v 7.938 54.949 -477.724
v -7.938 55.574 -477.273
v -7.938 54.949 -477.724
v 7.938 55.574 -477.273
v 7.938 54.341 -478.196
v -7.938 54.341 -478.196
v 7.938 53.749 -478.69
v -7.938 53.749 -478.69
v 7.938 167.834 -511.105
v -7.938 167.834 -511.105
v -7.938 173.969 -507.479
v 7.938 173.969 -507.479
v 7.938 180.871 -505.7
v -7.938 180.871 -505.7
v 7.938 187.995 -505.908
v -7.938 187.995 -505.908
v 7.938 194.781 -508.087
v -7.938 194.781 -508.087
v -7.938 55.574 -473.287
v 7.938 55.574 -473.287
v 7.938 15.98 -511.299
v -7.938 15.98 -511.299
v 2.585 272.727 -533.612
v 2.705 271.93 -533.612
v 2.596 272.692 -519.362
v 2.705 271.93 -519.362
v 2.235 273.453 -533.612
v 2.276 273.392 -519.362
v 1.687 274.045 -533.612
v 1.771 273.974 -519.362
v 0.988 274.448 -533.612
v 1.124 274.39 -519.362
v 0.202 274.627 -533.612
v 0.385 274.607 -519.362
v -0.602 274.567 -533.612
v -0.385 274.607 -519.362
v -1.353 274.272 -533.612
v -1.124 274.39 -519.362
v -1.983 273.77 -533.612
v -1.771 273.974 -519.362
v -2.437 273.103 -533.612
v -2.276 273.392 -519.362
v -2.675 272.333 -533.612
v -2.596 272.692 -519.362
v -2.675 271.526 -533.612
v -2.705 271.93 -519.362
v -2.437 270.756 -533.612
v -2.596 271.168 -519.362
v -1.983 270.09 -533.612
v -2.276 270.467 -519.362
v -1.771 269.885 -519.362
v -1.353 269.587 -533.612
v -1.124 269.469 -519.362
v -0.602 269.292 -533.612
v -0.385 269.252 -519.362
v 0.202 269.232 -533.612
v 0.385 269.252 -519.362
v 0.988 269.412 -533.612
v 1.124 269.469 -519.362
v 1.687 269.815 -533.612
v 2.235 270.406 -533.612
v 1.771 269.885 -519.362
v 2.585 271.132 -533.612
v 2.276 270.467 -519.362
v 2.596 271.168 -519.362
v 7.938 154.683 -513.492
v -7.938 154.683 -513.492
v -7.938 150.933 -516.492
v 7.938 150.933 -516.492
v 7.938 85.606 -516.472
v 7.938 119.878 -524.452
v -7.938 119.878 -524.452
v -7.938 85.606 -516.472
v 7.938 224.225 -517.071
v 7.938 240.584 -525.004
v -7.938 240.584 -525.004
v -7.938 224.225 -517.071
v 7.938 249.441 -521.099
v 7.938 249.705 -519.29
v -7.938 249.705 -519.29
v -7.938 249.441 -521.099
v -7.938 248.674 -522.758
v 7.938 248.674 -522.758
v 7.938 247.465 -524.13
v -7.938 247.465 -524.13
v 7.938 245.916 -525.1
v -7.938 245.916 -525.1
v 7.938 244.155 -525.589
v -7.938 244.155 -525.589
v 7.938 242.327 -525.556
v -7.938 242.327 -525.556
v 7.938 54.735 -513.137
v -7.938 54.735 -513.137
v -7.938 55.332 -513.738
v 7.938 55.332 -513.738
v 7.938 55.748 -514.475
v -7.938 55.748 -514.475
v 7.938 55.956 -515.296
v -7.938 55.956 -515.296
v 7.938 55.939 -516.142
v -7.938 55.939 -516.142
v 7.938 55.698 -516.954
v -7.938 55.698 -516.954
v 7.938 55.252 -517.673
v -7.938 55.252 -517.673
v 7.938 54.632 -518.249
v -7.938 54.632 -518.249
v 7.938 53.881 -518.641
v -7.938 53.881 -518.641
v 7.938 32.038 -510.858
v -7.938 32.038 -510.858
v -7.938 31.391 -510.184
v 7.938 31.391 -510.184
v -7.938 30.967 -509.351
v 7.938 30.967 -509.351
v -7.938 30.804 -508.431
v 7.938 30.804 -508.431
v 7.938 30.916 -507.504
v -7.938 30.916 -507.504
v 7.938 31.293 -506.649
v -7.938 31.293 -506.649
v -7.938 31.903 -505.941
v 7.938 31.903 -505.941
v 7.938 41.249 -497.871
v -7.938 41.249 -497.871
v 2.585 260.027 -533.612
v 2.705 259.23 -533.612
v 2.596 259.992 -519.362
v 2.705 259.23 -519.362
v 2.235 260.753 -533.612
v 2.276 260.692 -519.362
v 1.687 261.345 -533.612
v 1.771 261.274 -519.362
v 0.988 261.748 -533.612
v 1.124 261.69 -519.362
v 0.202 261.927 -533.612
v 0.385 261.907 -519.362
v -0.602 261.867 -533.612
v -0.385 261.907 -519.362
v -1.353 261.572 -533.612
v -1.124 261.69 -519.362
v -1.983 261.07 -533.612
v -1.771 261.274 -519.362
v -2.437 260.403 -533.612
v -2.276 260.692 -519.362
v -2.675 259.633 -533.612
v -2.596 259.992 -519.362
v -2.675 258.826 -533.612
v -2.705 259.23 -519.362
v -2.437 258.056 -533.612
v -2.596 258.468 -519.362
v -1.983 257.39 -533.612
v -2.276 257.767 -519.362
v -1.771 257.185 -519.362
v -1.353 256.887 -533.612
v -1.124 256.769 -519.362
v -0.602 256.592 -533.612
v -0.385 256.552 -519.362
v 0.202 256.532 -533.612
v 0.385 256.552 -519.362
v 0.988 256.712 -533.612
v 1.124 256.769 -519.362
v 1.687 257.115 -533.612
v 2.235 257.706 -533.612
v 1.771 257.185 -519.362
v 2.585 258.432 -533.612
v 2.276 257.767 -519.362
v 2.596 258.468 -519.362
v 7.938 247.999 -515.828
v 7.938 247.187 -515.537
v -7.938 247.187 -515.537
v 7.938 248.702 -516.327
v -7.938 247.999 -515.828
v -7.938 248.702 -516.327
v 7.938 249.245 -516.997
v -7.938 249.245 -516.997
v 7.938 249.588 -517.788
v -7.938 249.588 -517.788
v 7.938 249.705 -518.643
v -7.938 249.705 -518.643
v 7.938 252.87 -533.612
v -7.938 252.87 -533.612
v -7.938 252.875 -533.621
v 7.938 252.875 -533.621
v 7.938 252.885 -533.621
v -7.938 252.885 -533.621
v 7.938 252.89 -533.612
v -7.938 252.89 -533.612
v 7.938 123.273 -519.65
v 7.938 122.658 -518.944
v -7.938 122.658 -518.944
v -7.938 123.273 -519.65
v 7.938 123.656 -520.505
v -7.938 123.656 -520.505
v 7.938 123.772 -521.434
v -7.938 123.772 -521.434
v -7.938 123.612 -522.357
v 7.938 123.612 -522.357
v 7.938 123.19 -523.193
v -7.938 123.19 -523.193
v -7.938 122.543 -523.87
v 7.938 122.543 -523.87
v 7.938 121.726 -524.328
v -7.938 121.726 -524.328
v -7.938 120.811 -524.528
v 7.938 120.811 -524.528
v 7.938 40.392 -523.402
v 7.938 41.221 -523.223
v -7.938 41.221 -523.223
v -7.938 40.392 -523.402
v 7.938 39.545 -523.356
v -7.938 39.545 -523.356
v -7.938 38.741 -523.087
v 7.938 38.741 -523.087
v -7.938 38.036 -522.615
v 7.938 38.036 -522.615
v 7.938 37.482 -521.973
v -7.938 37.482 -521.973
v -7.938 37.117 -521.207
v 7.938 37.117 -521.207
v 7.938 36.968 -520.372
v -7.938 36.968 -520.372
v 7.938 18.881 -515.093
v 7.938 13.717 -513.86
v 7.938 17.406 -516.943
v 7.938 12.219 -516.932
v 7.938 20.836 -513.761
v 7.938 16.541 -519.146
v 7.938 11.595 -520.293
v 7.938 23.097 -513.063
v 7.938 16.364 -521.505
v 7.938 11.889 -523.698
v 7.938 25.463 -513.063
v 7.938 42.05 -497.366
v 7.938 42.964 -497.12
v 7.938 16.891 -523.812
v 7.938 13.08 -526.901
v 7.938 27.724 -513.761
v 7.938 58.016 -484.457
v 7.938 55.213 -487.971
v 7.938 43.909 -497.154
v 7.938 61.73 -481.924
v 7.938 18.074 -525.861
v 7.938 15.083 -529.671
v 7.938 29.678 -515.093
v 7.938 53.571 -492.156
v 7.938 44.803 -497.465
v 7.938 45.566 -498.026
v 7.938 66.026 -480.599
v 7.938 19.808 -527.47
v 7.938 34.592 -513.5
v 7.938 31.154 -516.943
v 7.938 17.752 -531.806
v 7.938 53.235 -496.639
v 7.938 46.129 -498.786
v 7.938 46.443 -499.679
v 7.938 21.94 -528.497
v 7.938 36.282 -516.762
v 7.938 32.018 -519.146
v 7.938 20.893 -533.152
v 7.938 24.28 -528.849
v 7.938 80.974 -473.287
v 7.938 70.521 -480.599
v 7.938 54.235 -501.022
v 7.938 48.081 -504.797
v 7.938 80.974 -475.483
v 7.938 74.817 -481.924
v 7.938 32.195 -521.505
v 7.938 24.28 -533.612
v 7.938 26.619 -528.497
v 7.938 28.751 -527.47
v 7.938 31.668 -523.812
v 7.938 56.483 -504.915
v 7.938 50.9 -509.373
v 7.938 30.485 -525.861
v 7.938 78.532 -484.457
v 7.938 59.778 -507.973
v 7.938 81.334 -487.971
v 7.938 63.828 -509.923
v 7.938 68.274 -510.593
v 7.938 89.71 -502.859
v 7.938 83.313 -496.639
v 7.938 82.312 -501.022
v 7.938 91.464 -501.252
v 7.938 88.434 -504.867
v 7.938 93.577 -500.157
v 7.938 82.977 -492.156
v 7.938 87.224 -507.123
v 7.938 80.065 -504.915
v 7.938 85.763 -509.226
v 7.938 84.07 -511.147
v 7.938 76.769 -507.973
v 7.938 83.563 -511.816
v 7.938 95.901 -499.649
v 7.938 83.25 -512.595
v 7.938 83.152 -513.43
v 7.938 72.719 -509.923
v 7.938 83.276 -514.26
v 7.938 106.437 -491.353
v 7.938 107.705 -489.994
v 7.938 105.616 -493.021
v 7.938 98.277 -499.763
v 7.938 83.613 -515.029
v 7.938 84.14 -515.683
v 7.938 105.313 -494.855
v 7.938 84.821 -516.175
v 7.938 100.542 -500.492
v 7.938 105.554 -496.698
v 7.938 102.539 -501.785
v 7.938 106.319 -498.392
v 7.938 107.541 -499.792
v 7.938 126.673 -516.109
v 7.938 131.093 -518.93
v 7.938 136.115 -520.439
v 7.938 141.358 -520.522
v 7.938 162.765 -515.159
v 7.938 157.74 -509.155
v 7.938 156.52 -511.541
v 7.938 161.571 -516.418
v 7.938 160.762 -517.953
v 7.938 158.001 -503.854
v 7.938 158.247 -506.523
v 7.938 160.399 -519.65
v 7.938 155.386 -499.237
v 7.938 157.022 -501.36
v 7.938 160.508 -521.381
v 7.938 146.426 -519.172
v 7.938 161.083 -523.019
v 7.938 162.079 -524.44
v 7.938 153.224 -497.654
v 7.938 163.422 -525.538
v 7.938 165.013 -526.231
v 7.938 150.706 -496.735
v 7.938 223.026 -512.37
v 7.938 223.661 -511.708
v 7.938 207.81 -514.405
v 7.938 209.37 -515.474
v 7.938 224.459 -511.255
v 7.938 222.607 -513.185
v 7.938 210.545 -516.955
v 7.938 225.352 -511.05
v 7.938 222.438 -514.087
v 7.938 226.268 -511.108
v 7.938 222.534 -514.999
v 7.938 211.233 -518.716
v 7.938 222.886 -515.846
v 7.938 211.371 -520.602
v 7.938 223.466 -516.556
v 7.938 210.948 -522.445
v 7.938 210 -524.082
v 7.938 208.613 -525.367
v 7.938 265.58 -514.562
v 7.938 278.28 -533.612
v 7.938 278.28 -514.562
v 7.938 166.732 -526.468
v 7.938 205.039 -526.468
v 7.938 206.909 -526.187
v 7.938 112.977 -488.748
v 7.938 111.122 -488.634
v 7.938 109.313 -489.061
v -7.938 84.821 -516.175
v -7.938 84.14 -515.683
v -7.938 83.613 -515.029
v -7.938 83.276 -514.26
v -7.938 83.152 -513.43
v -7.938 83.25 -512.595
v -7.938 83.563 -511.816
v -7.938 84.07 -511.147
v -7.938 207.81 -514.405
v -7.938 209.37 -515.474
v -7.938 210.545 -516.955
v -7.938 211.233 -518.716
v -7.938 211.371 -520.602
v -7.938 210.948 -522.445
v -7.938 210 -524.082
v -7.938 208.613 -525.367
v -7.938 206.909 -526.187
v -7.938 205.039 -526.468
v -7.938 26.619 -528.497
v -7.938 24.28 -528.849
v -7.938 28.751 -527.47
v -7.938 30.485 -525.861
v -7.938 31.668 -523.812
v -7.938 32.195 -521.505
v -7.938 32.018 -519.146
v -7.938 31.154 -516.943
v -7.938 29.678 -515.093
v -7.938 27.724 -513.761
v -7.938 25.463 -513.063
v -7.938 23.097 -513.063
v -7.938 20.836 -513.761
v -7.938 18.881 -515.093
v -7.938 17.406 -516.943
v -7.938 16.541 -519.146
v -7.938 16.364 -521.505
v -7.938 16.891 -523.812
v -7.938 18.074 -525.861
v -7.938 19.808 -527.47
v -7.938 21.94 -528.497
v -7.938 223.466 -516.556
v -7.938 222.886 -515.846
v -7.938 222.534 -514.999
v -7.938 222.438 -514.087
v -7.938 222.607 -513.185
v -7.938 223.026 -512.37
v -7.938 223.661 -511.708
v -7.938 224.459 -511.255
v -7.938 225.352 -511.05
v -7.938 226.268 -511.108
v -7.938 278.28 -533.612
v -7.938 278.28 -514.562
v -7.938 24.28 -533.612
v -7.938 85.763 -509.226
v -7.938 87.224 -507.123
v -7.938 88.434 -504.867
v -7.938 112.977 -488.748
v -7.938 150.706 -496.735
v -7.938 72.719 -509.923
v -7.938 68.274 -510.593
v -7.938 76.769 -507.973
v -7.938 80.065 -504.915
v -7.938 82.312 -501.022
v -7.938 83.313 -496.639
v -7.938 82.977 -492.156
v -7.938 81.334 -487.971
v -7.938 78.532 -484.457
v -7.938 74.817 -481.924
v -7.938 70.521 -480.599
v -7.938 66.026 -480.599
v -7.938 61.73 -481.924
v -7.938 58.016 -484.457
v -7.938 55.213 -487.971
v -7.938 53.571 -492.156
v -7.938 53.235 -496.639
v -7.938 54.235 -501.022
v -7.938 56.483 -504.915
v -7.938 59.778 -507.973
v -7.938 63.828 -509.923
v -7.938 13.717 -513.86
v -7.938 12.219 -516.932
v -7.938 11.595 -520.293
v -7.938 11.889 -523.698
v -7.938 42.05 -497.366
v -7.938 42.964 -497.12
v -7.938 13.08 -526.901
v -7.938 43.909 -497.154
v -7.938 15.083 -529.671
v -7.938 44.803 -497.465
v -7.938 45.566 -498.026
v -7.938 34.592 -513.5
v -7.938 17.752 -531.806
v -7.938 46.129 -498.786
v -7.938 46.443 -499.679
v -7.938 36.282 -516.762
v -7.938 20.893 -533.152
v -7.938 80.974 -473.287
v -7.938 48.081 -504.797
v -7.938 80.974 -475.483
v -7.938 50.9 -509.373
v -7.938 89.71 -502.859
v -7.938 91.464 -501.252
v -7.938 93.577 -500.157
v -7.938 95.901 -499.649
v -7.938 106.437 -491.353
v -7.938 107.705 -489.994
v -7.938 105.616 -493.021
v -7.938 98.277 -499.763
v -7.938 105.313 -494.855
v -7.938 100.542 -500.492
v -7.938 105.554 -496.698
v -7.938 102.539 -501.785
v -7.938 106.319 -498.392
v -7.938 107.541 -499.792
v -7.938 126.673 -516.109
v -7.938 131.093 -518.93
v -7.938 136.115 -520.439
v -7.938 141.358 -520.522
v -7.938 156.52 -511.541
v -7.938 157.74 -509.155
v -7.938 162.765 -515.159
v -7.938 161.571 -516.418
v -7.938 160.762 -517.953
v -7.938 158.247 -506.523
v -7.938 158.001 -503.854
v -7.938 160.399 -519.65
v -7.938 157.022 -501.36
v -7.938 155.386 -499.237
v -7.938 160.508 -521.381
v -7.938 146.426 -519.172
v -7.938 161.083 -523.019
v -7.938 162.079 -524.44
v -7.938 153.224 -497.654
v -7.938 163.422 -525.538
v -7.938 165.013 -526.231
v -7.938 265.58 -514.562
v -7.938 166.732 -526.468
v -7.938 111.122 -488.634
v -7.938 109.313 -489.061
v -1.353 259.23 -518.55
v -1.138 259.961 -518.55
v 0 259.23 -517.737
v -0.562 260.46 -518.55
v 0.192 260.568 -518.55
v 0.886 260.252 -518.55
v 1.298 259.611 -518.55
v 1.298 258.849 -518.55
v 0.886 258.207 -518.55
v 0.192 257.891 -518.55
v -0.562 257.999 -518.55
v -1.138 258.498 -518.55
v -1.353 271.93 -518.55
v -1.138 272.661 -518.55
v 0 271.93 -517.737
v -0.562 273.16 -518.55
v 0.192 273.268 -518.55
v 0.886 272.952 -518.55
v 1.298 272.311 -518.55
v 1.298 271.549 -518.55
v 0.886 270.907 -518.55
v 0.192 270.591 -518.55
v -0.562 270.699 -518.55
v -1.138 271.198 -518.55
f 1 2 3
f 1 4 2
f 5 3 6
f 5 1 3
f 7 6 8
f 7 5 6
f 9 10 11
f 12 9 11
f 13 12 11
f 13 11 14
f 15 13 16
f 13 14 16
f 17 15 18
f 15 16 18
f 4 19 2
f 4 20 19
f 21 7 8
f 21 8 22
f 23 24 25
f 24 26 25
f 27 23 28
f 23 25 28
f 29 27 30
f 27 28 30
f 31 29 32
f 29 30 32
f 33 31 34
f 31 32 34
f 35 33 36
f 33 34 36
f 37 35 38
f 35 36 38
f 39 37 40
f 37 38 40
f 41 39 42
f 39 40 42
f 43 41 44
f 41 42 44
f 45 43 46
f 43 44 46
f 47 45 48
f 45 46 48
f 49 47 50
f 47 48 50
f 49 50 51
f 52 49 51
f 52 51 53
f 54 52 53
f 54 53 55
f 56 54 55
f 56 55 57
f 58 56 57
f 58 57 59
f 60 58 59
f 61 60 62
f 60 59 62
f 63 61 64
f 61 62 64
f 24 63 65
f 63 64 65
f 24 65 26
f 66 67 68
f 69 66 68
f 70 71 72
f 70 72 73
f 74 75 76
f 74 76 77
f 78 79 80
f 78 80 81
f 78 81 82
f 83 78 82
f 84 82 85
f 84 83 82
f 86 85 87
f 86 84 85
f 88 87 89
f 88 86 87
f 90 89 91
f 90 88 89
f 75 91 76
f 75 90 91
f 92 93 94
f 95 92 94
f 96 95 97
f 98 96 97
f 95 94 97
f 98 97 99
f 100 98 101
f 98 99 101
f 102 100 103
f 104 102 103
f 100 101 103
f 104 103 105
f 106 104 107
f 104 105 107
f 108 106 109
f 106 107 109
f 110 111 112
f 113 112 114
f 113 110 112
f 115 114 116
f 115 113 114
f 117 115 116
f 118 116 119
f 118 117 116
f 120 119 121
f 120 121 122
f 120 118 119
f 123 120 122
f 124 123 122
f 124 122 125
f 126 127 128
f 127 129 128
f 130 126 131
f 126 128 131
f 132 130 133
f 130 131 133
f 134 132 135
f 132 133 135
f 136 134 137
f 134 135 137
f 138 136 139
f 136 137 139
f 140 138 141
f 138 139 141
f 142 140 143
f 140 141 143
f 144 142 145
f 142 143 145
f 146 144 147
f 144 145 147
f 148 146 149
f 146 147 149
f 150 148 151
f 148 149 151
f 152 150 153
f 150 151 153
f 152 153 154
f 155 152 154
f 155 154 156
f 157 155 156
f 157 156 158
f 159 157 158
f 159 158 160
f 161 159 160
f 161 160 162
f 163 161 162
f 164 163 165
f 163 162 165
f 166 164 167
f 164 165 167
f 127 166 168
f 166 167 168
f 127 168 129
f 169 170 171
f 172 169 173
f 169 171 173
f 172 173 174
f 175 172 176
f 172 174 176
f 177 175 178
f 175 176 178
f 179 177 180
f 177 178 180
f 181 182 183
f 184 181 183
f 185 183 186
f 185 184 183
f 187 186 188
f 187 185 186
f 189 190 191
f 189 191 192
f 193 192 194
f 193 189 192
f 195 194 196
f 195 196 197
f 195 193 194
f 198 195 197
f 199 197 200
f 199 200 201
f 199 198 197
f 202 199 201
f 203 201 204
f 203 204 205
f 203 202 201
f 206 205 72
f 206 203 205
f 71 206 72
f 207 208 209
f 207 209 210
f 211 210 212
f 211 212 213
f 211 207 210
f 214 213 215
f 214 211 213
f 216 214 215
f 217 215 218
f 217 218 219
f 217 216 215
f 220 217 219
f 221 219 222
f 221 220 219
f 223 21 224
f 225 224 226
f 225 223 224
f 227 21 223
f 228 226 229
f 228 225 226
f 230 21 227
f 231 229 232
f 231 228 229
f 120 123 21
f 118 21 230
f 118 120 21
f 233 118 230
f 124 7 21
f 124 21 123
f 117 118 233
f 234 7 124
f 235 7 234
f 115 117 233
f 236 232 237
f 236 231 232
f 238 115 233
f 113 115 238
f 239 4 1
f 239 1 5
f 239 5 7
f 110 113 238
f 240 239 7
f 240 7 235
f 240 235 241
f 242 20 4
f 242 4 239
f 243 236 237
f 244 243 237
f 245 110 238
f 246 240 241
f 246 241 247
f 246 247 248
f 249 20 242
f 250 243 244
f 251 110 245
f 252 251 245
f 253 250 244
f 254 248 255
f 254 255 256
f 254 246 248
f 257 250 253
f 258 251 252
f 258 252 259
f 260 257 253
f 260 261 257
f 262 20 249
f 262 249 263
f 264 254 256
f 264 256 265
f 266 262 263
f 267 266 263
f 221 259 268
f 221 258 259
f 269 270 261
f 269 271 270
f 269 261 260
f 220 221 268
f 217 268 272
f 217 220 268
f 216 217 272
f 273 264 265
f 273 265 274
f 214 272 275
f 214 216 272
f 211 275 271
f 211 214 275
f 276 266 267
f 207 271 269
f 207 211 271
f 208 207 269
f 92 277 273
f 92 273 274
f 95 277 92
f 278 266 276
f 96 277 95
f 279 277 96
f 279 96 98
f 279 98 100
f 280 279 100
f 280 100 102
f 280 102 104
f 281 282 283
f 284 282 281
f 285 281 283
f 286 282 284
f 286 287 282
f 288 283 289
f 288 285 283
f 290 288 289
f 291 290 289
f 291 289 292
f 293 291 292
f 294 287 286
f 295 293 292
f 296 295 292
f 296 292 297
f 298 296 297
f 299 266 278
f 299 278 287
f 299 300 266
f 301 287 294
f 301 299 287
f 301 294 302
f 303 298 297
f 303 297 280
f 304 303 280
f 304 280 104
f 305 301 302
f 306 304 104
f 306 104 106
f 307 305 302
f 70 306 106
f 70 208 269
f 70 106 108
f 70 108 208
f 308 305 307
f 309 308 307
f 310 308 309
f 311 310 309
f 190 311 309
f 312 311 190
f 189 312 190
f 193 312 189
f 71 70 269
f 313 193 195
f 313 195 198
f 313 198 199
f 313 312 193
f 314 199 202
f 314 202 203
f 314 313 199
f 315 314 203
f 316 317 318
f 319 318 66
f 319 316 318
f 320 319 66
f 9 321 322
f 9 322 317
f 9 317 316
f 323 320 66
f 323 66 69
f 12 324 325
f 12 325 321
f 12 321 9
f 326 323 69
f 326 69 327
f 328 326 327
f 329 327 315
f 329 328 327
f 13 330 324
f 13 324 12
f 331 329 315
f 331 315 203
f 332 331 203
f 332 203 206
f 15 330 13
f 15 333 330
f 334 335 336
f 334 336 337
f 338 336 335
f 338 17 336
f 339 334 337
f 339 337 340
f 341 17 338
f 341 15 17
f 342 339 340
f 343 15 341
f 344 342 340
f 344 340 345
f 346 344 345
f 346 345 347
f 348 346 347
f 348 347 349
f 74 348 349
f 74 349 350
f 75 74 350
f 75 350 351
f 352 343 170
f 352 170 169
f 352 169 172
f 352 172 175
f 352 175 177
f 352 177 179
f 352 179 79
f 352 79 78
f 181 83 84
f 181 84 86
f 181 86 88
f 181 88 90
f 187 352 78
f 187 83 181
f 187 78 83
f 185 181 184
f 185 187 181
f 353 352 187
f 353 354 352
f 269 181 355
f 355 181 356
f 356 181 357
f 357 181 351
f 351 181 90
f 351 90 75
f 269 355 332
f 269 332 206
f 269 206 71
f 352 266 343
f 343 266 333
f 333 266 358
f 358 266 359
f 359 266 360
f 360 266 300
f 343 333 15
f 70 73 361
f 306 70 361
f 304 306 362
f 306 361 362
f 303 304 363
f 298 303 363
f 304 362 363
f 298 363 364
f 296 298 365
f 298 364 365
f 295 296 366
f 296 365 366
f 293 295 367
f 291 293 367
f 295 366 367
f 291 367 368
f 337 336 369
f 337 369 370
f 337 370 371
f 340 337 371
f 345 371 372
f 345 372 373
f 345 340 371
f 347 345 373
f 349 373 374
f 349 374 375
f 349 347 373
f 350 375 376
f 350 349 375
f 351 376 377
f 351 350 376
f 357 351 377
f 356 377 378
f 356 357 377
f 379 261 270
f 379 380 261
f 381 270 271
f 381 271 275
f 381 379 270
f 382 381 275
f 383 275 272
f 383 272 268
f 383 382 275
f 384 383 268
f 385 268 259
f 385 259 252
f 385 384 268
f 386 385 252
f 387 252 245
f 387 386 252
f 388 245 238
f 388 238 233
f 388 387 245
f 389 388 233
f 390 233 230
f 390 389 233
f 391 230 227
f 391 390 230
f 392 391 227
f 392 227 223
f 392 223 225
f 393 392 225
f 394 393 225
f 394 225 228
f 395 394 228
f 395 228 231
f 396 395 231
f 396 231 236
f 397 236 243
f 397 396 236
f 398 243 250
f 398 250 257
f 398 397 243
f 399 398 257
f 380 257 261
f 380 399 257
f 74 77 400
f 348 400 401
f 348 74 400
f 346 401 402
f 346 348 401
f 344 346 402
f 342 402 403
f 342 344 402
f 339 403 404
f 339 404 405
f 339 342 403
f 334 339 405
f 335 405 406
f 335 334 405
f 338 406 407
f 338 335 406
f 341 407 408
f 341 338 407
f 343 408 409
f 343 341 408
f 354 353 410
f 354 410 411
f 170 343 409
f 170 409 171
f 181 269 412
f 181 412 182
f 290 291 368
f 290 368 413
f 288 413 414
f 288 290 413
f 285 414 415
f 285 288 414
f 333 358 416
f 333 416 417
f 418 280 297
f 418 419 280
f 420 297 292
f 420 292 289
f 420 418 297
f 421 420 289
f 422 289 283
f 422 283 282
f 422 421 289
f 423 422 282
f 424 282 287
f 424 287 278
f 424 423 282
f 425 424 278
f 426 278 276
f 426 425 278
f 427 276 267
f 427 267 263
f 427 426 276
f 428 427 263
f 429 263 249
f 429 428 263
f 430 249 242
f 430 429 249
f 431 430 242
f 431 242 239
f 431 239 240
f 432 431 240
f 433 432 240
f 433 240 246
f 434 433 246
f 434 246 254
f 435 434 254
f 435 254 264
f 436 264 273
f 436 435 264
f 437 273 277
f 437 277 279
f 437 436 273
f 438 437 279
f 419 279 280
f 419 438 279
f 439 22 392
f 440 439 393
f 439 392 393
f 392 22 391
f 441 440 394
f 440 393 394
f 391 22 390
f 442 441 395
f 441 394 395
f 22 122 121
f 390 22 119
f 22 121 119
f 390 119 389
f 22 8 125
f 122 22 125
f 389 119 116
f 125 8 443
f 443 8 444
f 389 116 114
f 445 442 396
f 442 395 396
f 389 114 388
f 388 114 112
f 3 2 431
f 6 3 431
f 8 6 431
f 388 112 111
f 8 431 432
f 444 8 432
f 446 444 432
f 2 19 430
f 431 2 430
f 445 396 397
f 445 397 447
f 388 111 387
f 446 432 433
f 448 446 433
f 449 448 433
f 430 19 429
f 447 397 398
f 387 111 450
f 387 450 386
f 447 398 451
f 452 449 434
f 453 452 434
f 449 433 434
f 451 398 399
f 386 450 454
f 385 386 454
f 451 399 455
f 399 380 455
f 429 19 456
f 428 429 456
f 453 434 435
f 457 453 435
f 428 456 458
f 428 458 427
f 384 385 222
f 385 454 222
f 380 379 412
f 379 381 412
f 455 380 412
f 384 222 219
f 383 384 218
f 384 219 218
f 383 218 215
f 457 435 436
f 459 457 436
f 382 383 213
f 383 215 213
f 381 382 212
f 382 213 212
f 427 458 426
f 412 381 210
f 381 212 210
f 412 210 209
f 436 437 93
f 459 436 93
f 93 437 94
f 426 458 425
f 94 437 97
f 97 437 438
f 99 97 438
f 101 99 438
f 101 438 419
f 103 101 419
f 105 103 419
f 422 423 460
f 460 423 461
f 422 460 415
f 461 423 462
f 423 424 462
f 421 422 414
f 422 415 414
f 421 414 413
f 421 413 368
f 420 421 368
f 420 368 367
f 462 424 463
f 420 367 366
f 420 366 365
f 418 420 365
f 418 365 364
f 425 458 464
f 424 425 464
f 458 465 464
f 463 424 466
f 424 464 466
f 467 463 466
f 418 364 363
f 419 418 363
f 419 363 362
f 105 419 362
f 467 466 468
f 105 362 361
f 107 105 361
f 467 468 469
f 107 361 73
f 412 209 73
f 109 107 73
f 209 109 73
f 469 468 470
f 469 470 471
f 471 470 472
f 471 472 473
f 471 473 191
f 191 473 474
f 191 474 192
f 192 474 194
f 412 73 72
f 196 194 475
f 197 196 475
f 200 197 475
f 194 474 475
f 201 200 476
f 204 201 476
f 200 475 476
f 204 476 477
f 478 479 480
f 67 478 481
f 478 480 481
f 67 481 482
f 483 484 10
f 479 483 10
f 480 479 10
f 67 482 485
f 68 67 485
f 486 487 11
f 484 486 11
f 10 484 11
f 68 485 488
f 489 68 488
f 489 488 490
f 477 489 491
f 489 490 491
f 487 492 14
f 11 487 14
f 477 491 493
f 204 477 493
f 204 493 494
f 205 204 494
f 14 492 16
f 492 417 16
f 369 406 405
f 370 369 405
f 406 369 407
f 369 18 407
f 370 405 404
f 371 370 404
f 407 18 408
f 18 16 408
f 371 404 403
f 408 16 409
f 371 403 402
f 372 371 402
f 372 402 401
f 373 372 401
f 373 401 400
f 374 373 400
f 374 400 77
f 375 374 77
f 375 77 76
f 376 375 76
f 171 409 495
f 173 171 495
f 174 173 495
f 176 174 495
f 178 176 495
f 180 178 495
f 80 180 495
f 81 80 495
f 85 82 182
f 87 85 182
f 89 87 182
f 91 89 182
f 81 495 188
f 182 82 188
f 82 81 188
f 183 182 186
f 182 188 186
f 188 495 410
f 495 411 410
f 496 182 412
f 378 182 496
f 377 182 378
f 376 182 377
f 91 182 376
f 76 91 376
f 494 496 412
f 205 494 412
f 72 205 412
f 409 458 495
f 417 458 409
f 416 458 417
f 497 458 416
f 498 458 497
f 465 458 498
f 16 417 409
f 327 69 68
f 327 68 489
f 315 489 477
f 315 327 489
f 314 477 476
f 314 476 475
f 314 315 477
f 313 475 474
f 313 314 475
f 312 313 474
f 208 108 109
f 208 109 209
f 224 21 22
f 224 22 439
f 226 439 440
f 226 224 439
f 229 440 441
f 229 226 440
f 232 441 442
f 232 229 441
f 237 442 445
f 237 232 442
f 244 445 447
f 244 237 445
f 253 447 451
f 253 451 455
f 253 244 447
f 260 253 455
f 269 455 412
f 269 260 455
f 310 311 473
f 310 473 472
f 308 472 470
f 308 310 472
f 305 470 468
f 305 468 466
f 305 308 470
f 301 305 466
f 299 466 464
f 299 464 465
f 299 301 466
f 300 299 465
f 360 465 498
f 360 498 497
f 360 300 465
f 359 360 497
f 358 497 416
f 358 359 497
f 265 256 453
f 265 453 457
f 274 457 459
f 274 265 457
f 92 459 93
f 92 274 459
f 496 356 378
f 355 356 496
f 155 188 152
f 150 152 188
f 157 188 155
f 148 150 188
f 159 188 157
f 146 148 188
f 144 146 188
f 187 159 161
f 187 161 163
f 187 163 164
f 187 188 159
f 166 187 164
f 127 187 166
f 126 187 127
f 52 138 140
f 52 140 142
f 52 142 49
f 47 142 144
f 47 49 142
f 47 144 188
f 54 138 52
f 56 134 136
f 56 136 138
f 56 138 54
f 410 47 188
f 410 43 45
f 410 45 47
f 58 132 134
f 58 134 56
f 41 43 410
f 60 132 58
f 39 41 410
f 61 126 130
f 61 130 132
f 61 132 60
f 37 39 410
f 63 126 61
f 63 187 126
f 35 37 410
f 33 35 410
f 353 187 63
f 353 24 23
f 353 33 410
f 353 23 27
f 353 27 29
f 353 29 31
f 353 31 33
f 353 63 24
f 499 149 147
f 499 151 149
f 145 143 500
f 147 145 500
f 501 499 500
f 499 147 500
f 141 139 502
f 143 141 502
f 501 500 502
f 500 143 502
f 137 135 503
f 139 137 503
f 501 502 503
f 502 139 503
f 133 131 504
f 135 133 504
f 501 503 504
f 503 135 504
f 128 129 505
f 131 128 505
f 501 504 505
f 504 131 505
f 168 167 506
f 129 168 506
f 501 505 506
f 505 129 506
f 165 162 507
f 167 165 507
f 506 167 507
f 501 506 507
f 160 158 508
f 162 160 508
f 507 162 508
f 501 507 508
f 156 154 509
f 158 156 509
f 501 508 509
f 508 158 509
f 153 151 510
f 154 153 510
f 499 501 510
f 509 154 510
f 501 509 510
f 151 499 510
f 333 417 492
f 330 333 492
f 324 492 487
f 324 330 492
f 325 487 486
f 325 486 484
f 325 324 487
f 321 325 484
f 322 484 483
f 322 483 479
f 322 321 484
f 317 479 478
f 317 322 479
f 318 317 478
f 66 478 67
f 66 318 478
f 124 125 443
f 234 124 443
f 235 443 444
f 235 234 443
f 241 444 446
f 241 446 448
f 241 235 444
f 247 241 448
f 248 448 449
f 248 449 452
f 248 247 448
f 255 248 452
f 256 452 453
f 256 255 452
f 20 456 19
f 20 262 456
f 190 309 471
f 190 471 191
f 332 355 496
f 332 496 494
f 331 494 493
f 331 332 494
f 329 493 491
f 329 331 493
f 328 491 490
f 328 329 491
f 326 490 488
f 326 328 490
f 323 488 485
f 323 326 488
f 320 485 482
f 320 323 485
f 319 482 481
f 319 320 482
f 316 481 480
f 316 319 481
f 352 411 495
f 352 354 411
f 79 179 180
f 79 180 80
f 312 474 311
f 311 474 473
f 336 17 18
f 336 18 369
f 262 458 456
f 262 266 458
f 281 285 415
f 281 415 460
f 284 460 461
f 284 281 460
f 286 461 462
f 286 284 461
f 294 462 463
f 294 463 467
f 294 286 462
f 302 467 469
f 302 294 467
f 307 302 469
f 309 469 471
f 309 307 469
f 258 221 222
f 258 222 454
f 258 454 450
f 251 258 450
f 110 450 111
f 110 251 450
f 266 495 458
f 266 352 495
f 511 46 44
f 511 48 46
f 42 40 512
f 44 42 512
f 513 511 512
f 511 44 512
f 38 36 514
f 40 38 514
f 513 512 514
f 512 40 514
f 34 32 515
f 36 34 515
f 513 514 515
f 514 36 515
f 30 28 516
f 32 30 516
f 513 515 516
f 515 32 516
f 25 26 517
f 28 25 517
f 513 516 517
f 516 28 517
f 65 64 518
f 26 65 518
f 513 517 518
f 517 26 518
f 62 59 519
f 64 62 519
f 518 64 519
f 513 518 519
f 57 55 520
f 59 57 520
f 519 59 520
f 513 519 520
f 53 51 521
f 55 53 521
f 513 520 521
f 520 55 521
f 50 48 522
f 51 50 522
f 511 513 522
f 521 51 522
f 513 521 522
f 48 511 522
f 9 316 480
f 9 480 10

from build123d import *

# Parameters (mm, degrees)
SKETCH1_R                       = 15.08125
SKETCH1_R_2                     = 7.9375
BOSS_EXTRUDE1_DEPTH             = 7.9375
TAP_DRILL_FOR_1_4_28_TAP1_D     = 5.4102
TAP_DRILL_FOR_1_4_28_TAP1_DEPTH = 14.249611939
TAP_DRILL_FOR_1_4_28_TAP1_TIP   = 1.625388061


with BuildPart() as part:
    # Sketch1 → Boss-Extrude1 (new body, symmetric)
    with BuildSketch(Plane(origin=(0, 0, 0), x_dir=(0, 0, -1), z_dir=(1, 0, 0))):
        with BuildLine():
            ThreePointArc((477.273006468, 55.573710947), (477.957555138, 54.643144528), (478.689532564, 53.74940531))
            Line((478.689532564, 53.74940531), (511.29915841, 15.980017214))
            ThreePointArc((511.29915841, 15.980017214), (525.339576994, 12.376406632), (533.611992871, 24.279620434))
            Line((533.611992871, 24.279620434), (533.611992871, 252.869620434))
            ThreePointArc((533.611992871, 252.869620434), (533.621992871, 252.879620434), (533.611992871, 252.889620434))
            Line((533.611992871, 252.889620434), (533.611992871, 278.279620434))
            Line((533.611992871, 278.279620434), (514.561992871, 278.279620434))
            Line((514.561992871, 278.279620434), (514.561992871, 265.579620434))
            Line((514.561992871, 265.579620434), (475.482925659, 80.973710947))
            Line((475.482925659, 80.973710947), (473.286992871, 80.973710947))
            Line((473.286992871, 80.973710947), (473.286992871, 55.573710947))
            Line((473.286992871, 55.573710947), (477.273006468, 55.573710947))
        make_face()
        with Locations((495.511992871, 68.273710947)):
            Circle(SKETCH1_R, mode=Mode.SUBTRACT)
        with BuildLine():
            Line((513.492352541, 154.682917565), (516.491551882, 150.932886553))
            ThreePointArc((516.491551882, 150.932886553), (520.662032348, 138.733869971), (516.108721588, 126.672515404))
            Line((516.108721588, 126.672515404), (499.792202262, 107.541452006))
            ThreePointArc((499.792202262, 107.541452006), (492.156570852, 105.964813857), (488.748431965, 112.977177526))
            Line((488.748431965, 112.977177526), (496.735281949, 150.706320271))
            ThreePointArc((496.735281949, 150.706320271), (503.854492534, 158.001314948), (513.492352541, 154.682917565))
        make_face(mode=Mode.SUBTRACT)
        with BuildLine():
            Line((505.940679161, 31.90308853), (497.871284255, 41.249289229))
            ThreePointArc((497.871284255, 41.249289229), (497.275971755, 44.367979343), (499.679180371, 46.442880148))
            ThreePointArc((499.679180371, 46.442880148), (507.170500261, 49.352034741), (513.137493678, 54.73516057))
            ThreePointArc((513.137493678, 54.73516057), (516.142098705, 55.938560413), (518.64094789, 53.8814811))
            Line((518.64094789, 53.8814811), (523.222631148, 41.220667502))
            ThreePointArc((523.222631148, 41.220667502), (522.874411989, 38.372433477), (520.372083072, 36.968138764))
            ThreePointArc((520.372083072, 36.968138764), (515.06938347, 35.555874927), (510.857508795, 32.038315555))
            ThreePointArc((510.857508795, 32.038315555), (508.431176446, 30.804189453), (505.940679161, 31.90308853))
        make_face(mode=Mode.SUBTRACT)
        with Locations((520.911992871, 24.279620434)):
            Circle(SKETCH1_R_2, mode=Mode.SUBTRACT)
        with BuildLine():
            ThreePointArc((518.944357913, 122.658172896), (522.790818804, 123.432213046), (524.452355406, 119.877822007))
            Line((524.452355406, 119.877822007), (516.472291206, 85.606211423))
            ThreePointArc((516.472291206, 85.606211423), (514.260132633, 83.275664888), (511.146510795, 84.069674807))
            ThreePointArc((511.146510795, 84.069674807), (508.195718311, 86.524018724), (504.866661886, 88.434087744))
            ThreePointArc((504.866661886, 88.434087744), (499.826228678, 94.721972649), (501.785115668, 102.539019742))
            Line((501.785115668, 102.539019742), (518.944357913, 122.658172896))
        make_face(mode=Mode.SUBTRACT)
        with BuildLine():
            ThreePointArc((526.468242871, 166.731606566), (522.219734771, 160.739425678), (515.159193487, 162.76545866))
            Line((515.159193487, 162.76545866), (511.105468766, 167.834009193))
            ThreePointArc((511.105468766, 167.834009193), (505.69956043, 180.870864765), (508.086772693, 194.780741319))
            Line((508.086772693, 194.780741319), (514.404519469, 207.809941801))
            ThreePointArc((514.404519469, 207.809941801), (521.5395726, 211.228293635), (526.468242871, 205.039406675))
            Line((526.468242871, 205.039406675), (526.468242871, 166.731606566))
        make_face(mode=Mode.SUBTRACT)
        with BuildLine():
            ThreePointArc((515.536548916, 247.187161956), (516.643598283, 248.996229375), (518.642714422, 249.704620434))
            Line((518.642714422, 249.704620434), (519.289846204, 249.704620434))
            ThreePointArc((519.289846204, 249.704620434), (524.671082031, 246.725792482), (525.003569607, 240.584085308))
            Line((525.003569607, 240.584085308), (517.071165151, 224.224947846))
            ThreePointArc((517.071165151, 224.224947846), (513.18532078, 222.606581), (511.108137945, 226.26775693))
            Line((511.108137945, 226.26775693), (515.536548916, 247.187161956))
        make_face(mode=Mode.SUBTRACT)
    extrude(amount=BOSS_EXTRUDE1_DEPTH, both=True)

    # Tap Drill for 1/4-28 Tap1
    with Locations(Plane(origin=(0, 271.929620434, -533.611992871), x_dir=(-1, 0, 0), z_dir=(0, 0, -1))):
        with Locations((0, 0), (0, -12.7)):
            Hole(TAP_DRILL_FOR_1_4_28_TAP1_D / 2, depth=TAP_DRILL_FOR_1_4_28_TAP1_DEPTH)
            with Locations((0, 0, -(TAP_DRILL_FOR_1_4_28_TAP1_DEPTH + TAP_DRILL_FOR_1_4_28_TAP1_TIP / 2))):  # 118° drill point
                Cone(0, TAP_DRILL_FOR_1_4_28_TAP1_D / 2, TAP_DRILL_FOR_1_4_28_TAP1_TIP, mode=Mode.SUBTRACT)


solid = part.part
